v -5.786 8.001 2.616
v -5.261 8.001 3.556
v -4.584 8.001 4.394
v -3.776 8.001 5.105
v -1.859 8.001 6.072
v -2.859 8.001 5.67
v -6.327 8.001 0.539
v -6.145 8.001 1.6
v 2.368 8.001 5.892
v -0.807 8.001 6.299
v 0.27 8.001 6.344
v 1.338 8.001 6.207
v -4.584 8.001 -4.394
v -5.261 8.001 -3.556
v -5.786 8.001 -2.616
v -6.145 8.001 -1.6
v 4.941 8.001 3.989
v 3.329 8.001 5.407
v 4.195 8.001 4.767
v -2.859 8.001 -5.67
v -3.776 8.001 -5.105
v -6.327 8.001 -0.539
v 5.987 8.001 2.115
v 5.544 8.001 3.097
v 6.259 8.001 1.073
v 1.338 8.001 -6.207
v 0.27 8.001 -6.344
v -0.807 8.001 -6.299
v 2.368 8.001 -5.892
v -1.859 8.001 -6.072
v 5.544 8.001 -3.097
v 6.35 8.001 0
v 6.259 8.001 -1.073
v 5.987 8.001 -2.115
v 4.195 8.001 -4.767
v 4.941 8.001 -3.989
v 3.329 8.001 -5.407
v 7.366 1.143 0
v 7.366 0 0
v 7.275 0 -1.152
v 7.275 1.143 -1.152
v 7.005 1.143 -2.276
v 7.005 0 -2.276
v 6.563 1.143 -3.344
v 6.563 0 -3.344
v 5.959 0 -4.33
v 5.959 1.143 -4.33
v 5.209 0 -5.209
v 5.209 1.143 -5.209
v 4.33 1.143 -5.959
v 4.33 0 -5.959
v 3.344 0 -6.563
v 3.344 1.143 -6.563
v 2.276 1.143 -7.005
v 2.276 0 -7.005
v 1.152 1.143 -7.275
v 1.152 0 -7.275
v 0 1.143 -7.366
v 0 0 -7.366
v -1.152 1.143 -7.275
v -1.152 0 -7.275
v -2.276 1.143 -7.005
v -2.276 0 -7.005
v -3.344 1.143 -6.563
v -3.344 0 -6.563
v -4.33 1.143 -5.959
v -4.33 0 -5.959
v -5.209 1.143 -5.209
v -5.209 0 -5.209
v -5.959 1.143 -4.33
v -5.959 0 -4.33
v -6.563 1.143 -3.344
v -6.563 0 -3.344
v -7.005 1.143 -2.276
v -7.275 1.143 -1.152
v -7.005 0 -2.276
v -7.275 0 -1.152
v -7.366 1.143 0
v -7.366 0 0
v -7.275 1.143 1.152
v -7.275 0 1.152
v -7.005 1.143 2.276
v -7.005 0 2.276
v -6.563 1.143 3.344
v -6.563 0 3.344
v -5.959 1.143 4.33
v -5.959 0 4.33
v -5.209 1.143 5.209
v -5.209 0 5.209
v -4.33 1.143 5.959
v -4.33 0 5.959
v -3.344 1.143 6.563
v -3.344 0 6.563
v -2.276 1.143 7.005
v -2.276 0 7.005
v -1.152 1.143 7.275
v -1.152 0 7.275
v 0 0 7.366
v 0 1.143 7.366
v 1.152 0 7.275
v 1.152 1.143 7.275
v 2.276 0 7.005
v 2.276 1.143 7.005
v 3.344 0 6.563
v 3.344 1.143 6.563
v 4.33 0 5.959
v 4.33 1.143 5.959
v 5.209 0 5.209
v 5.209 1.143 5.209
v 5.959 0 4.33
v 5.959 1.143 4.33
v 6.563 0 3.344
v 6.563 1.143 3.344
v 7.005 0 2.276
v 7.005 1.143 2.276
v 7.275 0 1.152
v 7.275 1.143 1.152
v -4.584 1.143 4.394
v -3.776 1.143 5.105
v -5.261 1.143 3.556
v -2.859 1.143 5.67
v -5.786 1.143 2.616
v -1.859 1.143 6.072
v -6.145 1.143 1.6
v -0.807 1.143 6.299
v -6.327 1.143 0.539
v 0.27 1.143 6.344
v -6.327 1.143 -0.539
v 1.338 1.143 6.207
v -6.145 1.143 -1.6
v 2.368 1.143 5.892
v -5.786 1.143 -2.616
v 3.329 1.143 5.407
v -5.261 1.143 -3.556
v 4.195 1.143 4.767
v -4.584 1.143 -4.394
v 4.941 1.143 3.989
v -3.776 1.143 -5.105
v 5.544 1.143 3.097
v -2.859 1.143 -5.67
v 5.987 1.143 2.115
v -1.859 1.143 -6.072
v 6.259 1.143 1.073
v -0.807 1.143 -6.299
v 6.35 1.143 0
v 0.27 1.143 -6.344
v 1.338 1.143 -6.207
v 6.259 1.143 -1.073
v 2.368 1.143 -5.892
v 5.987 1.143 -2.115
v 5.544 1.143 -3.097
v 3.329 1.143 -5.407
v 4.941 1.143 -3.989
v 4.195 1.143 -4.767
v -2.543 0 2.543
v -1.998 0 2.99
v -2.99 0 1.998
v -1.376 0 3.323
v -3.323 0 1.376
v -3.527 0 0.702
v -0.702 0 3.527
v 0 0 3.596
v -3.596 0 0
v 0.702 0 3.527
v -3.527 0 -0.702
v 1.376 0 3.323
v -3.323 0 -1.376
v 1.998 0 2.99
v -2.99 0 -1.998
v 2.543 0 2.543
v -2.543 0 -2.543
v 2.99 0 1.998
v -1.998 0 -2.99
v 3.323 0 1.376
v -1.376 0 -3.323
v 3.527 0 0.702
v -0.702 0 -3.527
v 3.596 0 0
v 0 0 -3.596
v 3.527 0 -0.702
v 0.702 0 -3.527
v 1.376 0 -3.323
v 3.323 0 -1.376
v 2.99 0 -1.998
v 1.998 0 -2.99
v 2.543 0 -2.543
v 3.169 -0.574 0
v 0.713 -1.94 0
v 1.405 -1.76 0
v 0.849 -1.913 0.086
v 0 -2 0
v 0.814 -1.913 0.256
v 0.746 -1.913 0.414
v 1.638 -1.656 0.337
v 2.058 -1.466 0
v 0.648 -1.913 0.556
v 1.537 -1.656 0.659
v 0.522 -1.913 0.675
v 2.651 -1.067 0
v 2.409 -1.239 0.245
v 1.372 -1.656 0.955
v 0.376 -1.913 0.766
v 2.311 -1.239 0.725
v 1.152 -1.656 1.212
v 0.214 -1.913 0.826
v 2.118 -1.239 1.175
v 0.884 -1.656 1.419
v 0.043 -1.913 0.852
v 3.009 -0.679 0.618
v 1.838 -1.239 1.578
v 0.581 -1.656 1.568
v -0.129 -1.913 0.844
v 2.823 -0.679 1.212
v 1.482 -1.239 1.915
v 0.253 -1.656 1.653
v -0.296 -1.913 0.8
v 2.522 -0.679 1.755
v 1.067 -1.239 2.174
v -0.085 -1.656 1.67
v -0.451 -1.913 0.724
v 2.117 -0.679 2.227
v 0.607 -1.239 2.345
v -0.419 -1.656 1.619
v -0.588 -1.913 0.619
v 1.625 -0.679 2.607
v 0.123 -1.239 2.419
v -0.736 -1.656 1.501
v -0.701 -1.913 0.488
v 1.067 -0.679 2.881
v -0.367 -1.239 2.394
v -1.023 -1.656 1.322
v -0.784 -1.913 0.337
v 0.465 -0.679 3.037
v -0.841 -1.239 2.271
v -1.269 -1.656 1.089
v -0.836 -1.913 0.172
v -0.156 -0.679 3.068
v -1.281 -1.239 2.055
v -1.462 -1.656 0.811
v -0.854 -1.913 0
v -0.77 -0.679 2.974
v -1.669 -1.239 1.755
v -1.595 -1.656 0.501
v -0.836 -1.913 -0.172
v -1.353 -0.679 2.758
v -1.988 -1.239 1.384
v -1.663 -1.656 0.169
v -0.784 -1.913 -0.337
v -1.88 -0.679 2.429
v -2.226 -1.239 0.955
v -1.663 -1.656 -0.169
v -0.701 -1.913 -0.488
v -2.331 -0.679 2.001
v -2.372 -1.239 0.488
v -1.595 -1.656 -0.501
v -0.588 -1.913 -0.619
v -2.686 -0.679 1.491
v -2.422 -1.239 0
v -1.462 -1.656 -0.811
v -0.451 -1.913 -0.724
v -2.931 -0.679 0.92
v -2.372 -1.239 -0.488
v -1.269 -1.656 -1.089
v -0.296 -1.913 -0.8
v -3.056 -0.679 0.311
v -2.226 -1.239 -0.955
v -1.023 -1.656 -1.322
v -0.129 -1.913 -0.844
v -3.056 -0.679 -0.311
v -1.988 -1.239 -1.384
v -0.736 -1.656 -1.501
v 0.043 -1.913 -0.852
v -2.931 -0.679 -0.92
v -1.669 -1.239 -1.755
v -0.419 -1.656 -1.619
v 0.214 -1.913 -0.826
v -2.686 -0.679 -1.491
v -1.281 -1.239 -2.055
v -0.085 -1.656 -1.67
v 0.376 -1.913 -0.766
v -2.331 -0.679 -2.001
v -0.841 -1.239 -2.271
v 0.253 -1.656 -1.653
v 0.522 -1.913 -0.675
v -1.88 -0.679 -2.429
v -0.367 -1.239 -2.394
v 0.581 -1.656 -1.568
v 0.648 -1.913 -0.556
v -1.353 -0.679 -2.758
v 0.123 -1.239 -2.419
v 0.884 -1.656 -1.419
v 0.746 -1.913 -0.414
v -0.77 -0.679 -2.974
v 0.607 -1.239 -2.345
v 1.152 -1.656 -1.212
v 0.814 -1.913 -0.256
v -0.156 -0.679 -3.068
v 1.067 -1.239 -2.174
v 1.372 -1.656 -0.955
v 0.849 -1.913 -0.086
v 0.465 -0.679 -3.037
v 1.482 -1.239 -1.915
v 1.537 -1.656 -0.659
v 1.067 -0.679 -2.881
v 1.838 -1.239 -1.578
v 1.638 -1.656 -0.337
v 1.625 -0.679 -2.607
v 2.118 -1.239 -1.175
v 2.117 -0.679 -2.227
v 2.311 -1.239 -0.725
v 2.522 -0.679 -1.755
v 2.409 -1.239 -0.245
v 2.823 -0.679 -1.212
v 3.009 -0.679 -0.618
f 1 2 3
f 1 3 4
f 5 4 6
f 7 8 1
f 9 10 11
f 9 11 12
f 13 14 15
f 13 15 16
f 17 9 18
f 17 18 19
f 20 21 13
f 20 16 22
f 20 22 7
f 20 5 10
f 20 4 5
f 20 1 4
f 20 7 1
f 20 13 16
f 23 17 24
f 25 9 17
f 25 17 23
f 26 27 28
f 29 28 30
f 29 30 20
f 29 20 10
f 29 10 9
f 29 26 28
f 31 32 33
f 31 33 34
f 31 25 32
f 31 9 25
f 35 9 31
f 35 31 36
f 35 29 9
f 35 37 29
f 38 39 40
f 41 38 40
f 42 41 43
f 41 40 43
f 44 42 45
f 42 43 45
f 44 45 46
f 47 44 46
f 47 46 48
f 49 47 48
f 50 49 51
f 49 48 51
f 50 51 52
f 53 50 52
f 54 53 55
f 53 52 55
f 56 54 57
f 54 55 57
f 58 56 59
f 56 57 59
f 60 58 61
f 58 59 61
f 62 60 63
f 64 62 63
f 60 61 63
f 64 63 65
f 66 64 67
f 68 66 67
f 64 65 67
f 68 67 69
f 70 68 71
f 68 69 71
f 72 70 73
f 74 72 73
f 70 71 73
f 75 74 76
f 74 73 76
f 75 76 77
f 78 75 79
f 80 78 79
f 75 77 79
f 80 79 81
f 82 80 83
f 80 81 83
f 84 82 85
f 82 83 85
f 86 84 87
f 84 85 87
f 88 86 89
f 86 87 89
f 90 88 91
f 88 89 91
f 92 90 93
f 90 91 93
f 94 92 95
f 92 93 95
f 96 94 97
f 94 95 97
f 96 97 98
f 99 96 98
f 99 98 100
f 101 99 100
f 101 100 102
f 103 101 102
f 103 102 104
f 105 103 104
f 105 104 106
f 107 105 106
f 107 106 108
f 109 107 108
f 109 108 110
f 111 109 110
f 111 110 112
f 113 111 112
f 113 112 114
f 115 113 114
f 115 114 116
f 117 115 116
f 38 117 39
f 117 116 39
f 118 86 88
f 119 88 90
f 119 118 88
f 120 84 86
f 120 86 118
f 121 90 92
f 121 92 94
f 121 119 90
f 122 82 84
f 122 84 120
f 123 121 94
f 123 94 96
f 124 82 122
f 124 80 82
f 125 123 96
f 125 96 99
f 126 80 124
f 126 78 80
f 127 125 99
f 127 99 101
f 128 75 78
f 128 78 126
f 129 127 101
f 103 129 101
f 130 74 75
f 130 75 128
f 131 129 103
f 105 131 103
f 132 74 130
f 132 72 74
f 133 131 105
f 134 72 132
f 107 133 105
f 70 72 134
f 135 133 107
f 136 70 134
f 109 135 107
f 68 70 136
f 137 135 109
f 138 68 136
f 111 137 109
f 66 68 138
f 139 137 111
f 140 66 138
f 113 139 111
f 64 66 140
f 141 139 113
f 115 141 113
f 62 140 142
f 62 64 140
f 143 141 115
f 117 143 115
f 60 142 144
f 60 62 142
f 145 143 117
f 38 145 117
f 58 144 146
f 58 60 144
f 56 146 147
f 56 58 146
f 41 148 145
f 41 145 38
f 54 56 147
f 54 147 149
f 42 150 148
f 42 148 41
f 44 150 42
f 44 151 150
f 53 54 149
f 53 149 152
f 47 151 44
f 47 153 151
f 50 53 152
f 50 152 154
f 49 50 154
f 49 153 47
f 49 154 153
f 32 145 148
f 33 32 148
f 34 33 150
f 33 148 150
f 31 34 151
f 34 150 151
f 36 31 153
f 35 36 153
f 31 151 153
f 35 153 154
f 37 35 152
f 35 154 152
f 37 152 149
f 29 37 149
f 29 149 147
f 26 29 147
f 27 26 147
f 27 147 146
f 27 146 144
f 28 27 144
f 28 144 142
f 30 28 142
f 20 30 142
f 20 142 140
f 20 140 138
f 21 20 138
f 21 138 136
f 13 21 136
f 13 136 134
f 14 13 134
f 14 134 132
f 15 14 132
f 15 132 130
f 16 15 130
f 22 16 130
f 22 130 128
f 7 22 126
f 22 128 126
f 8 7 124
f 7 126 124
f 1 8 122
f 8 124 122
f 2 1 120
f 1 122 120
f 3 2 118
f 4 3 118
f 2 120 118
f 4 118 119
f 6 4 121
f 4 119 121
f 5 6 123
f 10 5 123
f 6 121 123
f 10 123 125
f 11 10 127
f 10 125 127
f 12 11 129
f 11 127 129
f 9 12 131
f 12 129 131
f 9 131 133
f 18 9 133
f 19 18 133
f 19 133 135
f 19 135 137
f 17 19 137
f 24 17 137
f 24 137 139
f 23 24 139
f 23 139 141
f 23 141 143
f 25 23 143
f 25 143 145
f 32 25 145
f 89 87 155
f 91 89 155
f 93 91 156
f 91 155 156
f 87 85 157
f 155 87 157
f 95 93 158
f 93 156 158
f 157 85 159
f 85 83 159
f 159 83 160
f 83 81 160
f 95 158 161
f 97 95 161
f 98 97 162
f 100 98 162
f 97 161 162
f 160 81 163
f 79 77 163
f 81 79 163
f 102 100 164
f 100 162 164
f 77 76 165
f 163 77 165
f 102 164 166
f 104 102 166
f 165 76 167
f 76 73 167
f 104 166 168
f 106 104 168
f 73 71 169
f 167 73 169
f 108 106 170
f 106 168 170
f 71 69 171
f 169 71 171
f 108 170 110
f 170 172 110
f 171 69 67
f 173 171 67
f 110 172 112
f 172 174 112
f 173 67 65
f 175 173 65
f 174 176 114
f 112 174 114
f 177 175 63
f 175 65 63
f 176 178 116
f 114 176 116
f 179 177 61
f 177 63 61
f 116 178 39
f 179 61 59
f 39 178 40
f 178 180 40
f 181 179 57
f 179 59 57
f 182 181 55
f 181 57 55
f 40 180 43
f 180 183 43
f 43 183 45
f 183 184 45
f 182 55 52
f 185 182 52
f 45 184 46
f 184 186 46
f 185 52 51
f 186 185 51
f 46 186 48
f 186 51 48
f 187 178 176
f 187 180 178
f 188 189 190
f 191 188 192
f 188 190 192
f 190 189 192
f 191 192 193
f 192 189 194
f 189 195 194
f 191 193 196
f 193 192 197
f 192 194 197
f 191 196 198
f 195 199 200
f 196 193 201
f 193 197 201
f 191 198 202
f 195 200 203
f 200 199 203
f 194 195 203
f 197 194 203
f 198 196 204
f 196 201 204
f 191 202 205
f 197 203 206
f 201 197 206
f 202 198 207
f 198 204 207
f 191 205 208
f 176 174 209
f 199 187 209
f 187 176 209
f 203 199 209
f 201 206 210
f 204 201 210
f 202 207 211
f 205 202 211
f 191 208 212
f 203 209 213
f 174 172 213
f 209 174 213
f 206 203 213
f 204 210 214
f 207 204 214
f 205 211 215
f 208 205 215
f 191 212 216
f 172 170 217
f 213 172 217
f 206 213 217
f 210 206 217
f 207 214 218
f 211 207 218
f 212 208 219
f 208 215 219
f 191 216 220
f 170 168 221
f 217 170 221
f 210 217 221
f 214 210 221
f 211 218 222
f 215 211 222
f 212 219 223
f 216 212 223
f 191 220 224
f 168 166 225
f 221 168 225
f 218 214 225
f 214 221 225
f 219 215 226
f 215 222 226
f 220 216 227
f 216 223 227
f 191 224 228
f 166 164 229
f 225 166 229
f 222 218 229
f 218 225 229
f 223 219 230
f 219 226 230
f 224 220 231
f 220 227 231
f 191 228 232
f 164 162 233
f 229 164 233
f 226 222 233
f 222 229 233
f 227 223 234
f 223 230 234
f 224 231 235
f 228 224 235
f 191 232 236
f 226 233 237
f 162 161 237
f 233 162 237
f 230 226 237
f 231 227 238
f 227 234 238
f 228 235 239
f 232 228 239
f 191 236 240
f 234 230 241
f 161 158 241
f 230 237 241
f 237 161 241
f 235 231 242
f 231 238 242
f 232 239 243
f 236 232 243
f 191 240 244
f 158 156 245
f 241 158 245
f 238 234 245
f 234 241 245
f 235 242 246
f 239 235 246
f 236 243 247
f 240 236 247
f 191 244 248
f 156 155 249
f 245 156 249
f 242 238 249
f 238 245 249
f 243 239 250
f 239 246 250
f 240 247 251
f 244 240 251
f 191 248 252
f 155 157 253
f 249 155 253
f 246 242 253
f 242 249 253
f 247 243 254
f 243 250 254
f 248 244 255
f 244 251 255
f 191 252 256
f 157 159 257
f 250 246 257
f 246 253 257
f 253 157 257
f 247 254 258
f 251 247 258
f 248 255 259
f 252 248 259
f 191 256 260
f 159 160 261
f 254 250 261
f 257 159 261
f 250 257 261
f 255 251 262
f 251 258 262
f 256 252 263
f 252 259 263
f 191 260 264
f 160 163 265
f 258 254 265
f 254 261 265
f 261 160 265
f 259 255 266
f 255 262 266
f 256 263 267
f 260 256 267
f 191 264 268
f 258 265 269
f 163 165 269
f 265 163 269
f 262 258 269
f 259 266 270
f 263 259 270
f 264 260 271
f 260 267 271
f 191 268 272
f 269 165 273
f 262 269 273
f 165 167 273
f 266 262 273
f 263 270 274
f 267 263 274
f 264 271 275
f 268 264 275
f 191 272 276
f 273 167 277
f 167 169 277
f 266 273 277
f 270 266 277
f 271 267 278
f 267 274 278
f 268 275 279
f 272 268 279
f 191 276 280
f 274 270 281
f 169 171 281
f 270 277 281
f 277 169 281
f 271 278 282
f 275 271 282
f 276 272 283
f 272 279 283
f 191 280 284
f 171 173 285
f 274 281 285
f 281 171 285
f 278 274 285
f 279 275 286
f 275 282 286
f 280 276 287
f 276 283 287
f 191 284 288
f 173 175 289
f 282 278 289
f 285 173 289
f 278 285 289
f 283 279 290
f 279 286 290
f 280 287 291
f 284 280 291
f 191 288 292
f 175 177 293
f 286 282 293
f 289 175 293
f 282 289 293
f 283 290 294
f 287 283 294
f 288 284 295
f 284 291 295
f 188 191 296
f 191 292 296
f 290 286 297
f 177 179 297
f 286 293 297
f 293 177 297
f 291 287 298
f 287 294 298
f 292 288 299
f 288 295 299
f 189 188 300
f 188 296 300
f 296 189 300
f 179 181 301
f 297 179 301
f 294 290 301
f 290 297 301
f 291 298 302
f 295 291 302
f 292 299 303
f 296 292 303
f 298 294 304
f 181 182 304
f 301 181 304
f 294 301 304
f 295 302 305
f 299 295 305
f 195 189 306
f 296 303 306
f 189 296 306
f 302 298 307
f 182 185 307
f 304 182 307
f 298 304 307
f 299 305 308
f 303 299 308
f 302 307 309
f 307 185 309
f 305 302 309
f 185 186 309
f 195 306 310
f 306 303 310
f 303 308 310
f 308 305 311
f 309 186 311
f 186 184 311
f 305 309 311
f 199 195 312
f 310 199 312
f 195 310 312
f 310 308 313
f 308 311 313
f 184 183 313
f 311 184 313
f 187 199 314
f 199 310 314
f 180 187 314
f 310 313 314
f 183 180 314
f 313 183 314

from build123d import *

# Parameters (mm, degrees)
SKETCH1_R           = 6.35
BOSS_EXTRUDE1_DEPTH = 8.001
SKETCH1_3_R         = 7.366
SKETCH1_3_R_2       = 6.35
BOSS_EXTRUDE2_DEPTH = 1.143


with BuildPart() as part:
    # Sketch1 → Boss-Extrude1 (new body)
    with BuildSketch(Plane(origin=(0, 0, 0), x_dir=(1, 0, 0), z_dir=(0, 1, 0))):
        Circle(SKETCH1_R)
    extrude(amount=BOSS_EXTRUDE1_DEPTH)

    # Sketch1<3> → Boss-Extrude2 (add)
    with BuildSketch(Plane(origin=(0, 0, 0), x_dir=(1, 0, 0), z_dir=(0, 1, 0))):
        Circle(SKETCH1_3_R)
        Circle(SKETCH1_3_R_2, mode=Mode.SUBTRACT)
    extrude(amount=BOSS_EXTRUDE2_DEPTH)

    # Sketch3 → Revolve1 (revolve)
    with BuildSketch(Plane.XY):
        with BuildLine():
            Line((0, -2), (0, 0))
            Line((0, 0), (-3.596294389, 0))
            ThreePointArc((-3.596294389, 0), (-2.057506582, -1.466366354), (0, -2))
        make_face()
    revolve(axis=Axis((0, 0, 0), (0, -1, 0)))


solid = part.part
